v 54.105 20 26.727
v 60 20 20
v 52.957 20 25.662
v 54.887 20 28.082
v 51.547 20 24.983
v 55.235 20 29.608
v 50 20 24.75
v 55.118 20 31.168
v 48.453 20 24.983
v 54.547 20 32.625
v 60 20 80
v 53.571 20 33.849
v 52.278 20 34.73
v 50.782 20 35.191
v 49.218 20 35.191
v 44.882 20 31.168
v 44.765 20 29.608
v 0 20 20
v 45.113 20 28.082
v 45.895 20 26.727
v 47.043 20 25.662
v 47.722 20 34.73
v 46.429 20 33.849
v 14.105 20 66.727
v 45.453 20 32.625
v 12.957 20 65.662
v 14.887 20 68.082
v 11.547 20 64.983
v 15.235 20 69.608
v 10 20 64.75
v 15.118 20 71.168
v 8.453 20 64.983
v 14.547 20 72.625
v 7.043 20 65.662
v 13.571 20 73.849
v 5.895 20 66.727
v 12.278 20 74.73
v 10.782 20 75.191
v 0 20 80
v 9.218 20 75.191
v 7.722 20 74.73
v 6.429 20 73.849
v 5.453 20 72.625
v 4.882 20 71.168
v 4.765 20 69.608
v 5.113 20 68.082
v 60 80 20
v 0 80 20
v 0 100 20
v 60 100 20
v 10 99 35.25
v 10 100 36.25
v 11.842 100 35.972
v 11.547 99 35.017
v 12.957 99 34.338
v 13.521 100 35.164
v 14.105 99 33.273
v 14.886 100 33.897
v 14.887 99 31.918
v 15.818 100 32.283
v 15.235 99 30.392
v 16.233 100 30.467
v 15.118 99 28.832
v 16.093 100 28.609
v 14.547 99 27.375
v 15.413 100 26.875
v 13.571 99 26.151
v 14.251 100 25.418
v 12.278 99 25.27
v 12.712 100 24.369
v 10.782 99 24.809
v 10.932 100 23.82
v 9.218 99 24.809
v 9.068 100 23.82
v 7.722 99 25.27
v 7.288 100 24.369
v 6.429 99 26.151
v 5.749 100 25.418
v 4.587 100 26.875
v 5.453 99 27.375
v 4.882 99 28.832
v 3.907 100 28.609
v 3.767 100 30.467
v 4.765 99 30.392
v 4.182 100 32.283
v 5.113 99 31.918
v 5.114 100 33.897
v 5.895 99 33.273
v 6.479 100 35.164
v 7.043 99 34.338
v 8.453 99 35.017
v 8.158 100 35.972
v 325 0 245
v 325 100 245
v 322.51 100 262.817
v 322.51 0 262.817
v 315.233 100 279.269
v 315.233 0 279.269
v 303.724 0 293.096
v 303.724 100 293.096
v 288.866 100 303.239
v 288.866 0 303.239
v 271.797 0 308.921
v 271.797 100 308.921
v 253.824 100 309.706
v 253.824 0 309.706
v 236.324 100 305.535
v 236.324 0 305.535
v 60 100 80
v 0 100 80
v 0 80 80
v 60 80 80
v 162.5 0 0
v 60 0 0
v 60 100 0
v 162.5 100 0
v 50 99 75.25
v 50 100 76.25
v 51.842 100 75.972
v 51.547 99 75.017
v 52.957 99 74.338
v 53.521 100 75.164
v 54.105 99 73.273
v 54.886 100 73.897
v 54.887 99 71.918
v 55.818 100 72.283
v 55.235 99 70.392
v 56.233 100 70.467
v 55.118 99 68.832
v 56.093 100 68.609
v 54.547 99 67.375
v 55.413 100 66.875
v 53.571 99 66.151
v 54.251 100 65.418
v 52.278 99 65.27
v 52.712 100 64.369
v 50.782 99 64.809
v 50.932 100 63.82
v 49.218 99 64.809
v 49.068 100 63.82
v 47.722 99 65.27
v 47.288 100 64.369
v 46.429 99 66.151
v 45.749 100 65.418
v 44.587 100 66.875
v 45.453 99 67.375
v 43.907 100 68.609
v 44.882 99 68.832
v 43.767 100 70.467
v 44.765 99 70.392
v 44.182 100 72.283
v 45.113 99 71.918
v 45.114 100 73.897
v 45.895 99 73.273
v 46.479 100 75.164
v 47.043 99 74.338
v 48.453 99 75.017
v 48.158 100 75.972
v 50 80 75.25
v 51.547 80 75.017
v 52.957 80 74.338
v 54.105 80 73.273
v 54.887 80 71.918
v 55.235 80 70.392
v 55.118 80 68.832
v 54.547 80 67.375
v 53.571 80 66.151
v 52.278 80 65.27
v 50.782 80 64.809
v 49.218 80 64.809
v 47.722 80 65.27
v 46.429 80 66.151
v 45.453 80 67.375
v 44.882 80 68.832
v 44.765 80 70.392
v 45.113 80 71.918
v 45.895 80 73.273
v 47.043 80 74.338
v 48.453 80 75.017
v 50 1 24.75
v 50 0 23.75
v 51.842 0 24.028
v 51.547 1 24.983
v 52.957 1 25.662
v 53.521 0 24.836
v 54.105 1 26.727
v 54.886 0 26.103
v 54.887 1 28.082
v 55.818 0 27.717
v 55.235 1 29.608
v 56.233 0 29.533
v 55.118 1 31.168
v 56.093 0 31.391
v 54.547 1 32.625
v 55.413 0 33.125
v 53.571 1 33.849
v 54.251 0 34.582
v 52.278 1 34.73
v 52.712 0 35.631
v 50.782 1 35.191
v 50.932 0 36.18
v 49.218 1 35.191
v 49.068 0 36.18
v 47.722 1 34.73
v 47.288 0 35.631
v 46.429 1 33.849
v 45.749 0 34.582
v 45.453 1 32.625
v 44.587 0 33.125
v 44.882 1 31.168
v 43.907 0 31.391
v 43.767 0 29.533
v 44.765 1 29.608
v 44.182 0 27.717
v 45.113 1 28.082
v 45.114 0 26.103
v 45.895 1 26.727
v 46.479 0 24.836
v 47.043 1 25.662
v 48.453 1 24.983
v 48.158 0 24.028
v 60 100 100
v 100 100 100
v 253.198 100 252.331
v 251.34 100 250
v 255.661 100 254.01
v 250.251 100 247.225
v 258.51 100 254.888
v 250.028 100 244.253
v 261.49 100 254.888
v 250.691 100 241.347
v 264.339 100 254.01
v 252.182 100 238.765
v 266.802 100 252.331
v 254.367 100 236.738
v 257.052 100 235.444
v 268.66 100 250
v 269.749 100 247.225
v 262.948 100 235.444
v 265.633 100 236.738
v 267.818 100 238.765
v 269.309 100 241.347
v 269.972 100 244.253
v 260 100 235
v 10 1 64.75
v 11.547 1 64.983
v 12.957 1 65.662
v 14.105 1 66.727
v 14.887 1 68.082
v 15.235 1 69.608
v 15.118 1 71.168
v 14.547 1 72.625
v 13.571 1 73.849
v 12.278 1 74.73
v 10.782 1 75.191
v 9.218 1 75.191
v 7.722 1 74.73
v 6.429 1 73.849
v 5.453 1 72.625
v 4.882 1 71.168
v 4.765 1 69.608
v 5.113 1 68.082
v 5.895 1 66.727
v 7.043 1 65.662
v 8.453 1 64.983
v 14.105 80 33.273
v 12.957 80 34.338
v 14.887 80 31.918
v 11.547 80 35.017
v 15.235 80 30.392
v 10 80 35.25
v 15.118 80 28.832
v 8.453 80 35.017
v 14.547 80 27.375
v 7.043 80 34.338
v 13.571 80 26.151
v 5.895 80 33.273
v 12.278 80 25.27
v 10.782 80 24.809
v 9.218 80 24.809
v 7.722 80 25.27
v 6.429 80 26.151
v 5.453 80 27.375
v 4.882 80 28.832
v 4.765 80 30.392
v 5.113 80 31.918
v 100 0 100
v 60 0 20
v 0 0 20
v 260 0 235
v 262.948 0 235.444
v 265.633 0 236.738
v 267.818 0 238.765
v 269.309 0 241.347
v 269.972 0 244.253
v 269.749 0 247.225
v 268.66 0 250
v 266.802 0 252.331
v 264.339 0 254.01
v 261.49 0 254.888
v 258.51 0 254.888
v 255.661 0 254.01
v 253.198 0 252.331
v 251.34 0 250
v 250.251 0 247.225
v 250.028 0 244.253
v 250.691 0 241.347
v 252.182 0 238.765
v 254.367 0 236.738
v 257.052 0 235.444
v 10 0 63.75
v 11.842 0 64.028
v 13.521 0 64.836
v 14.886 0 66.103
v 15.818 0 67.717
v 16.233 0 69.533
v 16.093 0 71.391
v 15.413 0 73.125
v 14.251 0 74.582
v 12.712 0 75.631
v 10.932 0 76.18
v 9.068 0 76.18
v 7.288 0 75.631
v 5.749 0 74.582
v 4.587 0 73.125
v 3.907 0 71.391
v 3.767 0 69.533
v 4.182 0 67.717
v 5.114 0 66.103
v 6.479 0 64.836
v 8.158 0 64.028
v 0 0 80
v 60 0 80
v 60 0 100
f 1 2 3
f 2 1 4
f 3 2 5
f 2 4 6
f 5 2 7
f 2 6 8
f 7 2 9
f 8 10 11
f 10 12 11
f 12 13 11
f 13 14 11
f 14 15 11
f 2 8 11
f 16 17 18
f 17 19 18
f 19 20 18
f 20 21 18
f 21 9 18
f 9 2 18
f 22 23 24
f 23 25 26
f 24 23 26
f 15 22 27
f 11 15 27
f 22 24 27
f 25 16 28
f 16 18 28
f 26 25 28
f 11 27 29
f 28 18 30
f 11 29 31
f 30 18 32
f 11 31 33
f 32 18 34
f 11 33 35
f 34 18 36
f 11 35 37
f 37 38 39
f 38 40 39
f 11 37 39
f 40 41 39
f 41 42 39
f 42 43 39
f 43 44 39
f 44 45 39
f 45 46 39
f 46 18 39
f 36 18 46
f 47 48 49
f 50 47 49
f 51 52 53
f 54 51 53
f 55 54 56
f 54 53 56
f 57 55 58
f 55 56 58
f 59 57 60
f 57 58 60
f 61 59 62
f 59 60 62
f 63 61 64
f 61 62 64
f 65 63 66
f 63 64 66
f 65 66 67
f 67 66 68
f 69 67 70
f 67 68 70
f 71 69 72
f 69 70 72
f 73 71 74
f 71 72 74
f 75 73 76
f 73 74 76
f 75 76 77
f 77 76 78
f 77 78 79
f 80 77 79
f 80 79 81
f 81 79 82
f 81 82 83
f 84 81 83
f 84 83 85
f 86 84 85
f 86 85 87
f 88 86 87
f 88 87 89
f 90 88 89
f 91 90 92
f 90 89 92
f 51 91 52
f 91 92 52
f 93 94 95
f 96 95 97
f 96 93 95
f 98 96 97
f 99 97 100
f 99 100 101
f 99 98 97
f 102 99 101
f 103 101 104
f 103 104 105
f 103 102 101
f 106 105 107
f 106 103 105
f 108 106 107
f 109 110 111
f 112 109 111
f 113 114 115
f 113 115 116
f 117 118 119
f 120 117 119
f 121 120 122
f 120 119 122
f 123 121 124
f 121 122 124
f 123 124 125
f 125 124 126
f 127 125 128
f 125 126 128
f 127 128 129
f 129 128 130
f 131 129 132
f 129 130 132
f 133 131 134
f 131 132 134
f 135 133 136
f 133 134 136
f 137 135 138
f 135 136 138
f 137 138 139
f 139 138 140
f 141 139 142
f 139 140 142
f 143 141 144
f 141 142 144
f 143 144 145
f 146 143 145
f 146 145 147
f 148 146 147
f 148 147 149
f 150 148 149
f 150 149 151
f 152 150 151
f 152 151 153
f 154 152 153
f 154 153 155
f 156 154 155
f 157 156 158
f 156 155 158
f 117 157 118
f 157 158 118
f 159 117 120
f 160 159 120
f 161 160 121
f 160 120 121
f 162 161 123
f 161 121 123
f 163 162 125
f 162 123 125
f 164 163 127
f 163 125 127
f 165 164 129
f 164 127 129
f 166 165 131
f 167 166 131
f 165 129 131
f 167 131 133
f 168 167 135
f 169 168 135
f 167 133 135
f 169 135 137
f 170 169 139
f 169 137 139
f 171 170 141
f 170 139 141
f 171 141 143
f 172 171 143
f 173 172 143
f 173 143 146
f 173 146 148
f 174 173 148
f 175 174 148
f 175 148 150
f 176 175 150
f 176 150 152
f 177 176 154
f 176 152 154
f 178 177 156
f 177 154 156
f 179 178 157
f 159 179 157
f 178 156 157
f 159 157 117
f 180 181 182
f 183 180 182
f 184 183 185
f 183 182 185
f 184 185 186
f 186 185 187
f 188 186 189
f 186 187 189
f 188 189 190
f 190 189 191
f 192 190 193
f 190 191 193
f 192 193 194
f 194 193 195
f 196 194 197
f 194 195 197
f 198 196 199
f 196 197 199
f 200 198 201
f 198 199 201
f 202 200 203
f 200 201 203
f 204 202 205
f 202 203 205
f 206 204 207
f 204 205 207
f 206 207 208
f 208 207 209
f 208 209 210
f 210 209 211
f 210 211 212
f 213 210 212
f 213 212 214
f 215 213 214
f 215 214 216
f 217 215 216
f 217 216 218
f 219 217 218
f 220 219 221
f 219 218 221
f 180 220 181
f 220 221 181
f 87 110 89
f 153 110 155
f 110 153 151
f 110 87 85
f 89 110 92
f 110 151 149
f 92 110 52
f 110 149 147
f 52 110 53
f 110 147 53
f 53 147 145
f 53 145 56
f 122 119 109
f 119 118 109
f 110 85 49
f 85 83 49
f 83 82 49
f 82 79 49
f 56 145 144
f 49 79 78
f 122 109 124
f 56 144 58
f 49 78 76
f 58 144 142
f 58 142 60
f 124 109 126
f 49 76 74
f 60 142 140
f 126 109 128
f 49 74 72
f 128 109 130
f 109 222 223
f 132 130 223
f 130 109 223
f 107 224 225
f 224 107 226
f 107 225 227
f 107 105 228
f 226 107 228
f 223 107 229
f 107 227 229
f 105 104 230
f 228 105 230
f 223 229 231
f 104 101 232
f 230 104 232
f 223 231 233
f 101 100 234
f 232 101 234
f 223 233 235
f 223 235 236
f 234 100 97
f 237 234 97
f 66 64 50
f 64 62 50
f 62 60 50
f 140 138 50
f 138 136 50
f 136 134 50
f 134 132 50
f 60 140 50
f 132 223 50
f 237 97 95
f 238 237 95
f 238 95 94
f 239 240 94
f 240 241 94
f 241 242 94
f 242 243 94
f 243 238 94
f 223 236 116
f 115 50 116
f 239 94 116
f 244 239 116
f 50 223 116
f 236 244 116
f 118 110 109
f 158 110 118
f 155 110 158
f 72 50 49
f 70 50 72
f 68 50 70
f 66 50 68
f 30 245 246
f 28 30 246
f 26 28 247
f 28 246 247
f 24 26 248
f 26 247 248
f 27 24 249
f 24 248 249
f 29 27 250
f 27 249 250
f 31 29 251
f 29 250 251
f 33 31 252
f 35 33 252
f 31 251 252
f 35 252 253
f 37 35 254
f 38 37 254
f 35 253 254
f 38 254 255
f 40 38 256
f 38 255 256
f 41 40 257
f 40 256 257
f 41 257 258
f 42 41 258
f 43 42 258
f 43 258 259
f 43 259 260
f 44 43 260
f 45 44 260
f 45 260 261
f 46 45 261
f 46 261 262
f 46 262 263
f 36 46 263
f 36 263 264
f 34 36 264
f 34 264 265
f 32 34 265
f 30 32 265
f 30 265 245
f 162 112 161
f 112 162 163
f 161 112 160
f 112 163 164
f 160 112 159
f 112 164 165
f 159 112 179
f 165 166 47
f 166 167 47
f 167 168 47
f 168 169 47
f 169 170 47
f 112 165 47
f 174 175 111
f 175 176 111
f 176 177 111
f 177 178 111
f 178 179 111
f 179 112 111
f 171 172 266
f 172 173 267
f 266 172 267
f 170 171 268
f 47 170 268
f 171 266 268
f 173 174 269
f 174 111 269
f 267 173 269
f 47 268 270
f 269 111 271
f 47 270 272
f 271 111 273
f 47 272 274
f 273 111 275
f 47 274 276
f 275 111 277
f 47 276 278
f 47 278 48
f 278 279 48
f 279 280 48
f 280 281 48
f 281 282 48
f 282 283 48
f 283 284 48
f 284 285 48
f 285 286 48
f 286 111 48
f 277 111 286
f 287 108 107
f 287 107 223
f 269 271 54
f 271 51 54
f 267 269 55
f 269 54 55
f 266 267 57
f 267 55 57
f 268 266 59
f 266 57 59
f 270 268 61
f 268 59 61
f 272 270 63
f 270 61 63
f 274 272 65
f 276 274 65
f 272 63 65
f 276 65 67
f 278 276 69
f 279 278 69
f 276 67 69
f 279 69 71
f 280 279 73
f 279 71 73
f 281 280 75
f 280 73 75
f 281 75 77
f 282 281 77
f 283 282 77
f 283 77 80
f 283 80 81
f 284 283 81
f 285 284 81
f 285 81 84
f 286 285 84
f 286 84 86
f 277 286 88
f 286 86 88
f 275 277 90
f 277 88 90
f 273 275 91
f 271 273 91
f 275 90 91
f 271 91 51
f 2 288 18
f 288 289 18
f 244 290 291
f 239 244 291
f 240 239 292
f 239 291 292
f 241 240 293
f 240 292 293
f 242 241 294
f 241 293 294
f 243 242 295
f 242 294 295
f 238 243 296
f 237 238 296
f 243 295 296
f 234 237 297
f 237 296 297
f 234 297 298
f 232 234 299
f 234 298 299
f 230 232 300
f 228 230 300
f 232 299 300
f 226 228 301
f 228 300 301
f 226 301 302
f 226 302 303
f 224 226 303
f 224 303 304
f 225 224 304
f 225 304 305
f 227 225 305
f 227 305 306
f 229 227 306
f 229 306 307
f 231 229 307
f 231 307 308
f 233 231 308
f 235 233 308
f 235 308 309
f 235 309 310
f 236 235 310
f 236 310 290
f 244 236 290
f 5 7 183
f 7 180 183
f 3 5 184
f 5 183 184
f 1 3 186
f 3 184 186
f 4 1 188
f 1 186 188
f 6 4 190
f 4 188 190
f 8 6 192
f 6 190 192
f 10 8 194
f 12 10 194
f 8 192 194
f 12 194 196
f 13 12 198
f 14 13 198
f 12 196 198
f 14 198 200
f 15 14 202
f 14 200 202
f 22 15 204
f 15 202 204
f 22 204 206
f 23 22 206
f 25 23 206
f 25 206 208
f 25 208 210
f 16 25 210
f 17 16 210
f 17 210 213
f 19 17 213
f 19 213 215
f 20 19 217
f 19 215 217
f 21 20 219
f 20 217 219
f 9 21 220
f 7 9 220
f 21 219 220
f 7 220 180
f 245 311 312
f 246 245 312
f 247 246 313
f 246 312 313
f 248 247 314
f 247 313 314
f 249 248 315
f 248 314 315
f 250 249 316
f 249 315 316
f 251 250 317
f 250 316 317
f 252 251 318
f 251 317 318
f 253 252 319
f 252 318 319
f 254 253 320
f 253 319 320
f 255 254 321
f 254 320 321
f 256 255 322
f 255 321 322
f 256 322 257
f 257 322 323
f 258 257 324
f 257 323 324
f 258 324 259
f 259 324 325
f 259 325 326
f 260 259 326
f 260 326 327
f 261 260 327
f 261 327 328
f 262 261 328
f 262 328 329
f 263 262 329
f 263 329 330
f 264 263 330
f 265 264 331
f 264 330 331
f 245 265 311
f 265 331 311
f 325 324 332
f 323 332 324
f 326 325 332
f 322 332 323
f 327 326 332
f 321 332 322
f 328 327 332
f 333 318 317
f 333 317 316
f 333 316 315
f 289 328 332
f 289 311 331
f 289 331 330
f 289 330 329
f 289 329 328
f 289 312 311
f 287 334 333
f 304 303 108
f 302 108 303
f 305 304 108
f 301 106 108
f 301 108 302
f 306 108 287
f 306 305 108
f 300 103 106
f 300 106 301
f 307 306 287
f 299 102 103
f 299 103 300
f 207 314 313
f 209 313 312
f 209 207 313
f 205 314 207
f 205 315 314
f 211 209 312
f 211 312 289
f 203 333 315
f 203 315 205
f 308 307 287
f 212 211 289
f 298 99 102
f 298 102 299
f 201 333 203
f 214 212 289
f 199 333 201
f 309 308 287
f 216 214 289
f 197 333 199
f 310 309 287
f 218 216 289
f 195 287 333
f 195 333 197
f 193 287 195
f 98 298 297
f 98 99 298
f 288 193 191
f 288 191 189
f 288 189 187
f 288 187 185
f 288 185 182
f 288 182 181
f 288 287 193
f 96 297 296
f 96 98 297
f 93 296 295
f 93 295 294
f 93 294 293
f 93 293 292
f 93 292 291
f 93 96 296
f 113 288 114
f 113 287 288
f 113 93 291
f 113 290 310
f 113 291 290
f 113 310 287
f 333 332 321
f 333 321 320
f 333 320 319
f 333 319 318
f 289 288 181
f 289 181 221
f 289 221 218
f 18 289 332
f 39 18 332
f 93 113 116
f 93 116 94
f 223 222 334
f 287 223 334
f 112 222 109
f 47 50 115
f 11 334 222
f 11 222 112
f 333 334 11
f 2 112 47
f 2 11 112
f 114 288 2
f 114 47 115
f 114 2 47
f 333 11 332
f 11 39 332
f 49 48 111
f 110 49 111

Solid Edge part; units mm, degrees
sketch "Sketch1" plane through (0, 0, 0) normal (0, -1, 0) x (1, 0, 0)
  line L0 (325, 325) -> (0, 325)
  line L1 (0, 0) -> (0, 325)
  line L2 (0, 0) -> (325, 0)
  line L3 (325, 0) -> (325, 325)
extrude "Protrusion1" add sketch "Sketch1" against normal blind 100
sketch "Sketch2" plane through (0, 50, 162.5) normal (-1, 0, 0) x (0, -1, 0)
  line L0 (-50, 162.5) -> (-50, -62.5)
  line L1 (-50, -62.5) -> (50, -62.5)
  line L2 (50, -62.5) -> (50, 162.5)
  line L3 (50, 162.5) -> (-50, 162.5)
  dimension "D1" = 225
extrude "Extrusionsausschnitt_1" cut sketch "Sketch2" against normal blind 100
sketch "Sketch3" plane through (0, 50, 50) normal (-1, 0, 0) x (0, -1, 0)
  line L0 (30, 30) -> (50, 30)
  line L1 (50, 50) -> (50, 30)
  line L2 (-50, 50) -> (50, 50)
  line L3 (-50, 30) -> (-50, 50)
  line L4 (-50, 30) -> (-30, 30)
  line L5 (-30, 30) -> (-30, -30)
  line L6 (-30, -30) -> (-50, -30)
  line L7 (-50, -30) -> (-50, -50)
  line L8 (-50, -50) -> (50, -50)
  line L9 (50, -50) -> (50, -30)
  line L10 (50, -30) -> (30, -30)
  line L11 (30, -30) -> (30, 30)
extrude "Extrusionsausschnitt_2" cut sketch "Sketch3" against normal blind 60
sketch "Sketch4" plane through (162.5, 0, 162.5) normal (0, -1, 0) x (1, 0, 0)
  line L0 (0, -162.5) -> (162.5, 82.5)
  line L1 (162.5, 82.5) -> (162.5, -162.5)
  line L2 (162.5, -162.5) -> (0, -162.5)
  dimension "D1" = 245
extrude "Extrusionsausschnitt_3" cut sketch "Sketch4" against normal blind 100
sketch "Sketch5" plane through (162.5, 0, 162.5) normal (0, -1, 0) x (1, 0, 0)
  line L0 (86.7347, 162.5) -> (-62.5, -62.5)
  line L1 (-62.5, 162.5) -> (-62.5, -62.5)
  line L2 (86.7347, 162.5) -> (-62.5, 162.5)
extrude "Extrusionsausschnitt_4" cut sketch "Sketch5" against normal blind 100
hole "Bohrung_1" at (260, 0, 245) direction (0, 1, 0) diameter 20 end up to next
sketch "Sketch6" plane through (162.5, 0, 162.5) normal (0, -1, 0) x (1, 0, 0)
  arc A0 (162.5, 82.5) -> (64.2476, 138.3505) centre (97.5, 82.5) ccw
  line L0 (64.2476, 138.3505) -> (74.5932, 173.0121)
  line L1 (74.5932, 173.0121) -> (182.984, 173.0121)
  line L2 (182.984, 173.0121) -> (182.984, 82.5)
  line L3 (182.984, 82.5) -> (162.5, 82.5)
extrude "Extrusionsausschnitt_5" cut sketch "Sketch6" against normal blind 1030.7855
hole "Bohrung_2" at (10, 0, 70) direction (0, 1, 0) diameter 10.5 end up to next start chamfer 1 start chamfer angle 45
hole "Hole1" at (50, 0, 30) direction (0, 1, 0) diameter 10.5 end up to next start chamfer 1 start chamfer angle 45
hole "Bohrung_4" at (50, 100, 70) direction (0, -1, 0) diameter 10.5 end up to next start chamfer 1 start chamfer angle 45
hole "Hole2" at (10, 100, 30) direction (0, -1, 0) diameter 10.5 end up to next start chamfer 1 start chamfer angle 45
